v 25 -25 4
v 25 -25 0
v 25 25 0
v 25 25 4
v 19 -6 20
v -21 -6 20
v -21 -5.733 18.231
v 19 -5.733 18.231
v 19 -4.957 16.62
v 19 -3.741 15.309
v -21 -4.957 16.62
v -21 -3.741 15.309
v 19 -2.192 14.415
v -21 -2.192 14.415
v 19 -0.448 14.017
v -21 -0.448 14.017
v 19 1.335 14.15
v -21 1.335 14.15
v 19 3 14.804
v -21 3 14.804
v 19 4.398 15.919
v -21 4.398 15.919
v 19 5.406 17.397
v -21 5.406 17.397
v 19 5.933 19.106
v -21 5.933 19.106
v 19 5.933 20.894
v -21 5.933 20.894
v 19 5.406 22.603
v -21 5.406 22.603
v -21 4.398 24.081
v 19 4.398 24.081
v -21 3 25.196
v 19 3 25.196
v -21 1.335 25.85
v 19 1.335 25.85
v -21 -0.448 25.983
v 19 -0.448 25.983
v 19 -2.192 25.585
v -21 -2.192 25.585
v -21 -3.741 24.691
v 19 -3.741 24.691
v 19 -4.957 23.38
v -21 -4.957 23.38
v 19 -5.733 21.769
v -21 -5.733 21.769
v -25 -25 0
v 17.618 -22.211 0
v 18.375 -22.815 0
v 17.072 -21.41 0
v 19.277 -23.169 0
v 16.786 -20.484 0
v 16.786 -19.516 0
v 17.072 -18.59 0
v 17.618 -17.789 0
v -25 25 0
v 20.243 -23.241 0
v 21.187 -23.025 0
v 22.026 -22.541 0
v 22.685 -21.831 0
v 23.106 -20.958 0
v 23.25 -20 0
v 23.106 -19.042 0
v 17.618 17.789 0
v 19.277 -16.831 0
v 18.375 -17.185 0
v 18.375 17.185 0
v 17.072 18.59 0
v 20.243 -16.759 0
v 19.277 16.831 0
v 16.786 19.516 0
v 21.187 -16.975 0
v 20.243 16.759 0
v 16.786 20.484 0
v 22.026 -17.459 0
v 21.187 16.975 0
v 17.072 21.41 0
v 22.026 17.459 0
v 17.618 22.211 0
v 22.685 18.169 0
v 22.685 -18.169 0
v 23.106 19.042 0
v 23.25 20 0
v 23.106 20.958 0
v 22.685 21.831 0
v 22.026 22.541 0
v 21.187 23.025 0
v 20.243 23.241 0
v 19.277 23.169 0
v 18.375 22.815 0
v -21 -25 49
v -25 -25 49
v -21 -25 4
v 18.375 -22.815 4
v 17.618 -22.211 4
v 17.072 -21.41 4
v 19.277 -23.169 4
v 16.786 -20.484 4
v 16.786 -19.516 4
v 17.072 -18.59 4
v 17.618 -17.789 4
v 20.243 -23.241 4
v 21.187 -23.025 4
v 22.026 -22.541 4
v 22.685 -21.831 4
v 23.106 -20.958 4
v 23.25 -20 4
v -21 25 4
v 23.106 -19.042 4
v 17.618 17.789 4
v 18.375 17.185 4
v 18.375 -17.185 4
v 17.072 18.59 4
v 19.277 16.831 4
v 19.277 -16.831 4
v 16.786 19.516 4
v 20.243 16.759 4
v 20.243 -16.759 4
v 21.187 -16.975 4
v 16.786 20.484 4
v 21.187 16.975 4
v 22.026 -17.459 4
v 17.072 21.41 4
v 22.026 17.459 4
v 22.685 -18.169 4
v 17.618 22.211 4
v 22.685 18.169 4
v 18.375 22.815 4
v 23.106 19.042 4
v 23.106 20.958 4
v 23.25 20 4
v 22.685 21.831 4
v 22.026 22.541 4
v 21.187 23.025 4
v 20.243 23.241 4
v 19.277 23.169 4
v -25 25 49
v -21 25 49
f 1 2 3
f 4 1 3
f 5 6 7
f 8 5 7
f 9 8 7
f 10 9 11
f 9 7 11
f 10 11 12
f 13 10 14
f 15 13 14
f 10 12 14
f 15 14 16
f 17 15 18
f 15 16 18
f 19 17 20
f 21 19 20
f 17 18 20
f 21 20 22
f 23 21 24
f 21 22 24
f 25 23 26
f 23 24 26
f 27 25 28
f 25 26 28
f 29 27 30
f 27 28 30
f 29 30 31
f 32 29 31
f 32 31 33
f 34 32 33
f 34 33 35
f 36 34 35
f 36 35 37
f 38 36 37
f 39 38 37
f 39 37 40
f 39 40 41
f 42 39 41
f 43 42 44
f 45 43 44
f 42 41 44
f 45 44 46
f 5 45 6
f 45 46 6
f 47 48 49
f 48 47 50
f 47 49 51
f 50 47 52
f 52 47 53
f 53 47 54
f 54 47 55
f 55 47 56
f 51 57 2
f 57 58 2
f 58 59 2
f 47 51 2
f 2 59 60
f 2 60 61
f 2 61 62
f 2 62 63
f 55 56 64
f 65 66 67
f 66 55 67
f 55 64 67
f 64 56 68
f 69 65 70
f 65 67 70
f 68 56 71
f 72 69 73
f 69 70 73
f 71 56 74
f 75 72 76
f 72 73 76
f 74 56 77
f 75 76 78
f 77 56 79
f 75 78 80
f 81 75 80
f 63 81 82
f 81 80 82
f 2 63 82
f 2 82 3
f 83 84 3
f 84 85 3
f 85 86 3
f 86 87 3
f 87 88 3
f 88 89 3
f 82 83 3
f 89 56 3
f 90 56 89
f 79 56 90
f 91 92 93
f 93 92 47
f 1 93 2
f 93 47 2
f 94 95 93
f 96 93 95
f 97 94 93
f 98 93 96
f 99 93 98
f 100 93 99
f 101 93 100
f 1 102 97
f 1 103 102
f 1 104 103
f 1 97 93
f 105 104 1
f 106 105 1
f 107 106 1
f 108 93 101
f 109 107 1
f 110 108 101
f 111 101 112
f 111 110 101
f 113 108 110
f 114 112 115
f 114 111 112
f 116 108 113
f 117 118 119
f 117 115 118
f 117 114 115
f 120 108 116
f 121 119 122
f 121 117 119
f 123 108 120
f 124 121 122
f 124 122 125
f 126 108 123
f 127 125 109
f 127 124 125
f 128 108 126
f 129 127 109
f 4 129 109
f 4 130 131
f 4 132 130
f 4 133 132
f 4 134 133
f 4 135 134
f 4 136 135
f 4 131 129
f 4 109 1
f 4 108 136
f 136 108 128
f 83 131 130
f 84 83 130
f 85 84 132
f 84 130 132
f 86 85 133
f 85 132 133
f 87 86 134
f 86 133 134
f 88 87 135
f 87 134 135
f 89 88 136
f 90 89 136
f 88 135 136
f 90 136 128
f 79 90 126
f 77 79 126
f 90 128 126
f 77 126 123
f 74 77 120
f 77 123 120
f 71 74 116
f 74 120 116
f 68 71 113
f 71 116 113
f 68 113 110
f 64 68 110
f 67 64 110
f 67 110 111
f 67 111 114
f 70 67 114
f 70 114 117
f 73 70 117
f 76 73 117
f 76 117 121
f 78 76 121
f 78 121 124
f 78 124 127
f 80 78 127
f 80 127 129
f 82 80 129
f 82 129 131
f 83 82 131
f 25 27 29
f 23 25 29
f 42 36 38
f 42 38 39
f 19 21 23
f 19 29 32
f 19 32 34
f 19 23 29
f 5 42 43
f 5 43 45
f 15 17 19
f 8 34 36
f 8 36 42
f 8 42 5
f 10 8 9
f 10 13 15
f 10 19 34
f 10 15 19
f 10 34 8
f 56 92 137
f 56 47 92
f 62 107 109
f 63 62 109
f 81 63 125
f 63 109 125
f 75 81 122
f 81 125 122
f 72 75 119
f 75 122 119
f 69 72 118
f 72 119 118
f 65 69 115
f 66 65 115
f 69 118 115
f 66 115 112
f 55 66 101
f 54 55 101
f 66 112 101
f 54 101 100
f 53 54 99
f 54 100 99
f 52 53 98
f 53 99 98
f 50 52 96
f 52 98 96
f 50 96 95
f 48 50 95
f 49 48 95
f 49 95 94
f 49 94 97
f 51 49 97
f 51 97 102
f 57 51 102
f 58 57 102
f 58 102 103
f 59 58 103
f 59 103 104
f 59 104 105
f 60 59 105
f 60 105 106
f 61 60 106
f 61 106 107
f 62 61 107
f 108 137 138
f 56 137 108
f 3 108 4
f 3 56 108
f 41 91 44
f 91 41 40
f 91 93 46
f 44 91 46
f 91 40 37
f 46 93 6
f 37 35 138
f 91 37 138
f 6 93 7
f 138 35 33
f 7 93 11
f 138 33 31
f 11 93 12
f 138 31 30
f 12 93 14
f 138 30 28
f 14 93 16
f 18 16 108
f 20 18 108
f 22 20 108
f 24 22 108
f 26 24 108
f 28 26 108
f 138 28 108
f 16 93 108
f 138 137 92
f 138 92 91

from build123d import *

# Parameters (mm, degrees)
SKETCH1_W           = 50
SKETCH1_H           = 50
BOSS_EXTRUDE1_DEPTH = 4
SKETCH2_W           = 4
SKETCH2_H           = 50
BOSS_EXTRUDE2_DEPTH = 45
SKETCH4_R           = 6
BOSS_EXTRUDE3_DEPTH = 40
SKETCH5_R           = 3.25
CUT_EXTRUDE1_DEPTH  = 40


with BuildPart() as part:
    # Sketch1 → Boss-Extrude1 (new body)
    with BuildSketch(Plane.XY):
        Rectangle(SKETCH1_W, SKETCH1_H)
    extrude(amount=BOSS_EXTRUDE1_DEPTH)

    # Sketch2 → Boss-Extrude2 (add)
    with BuildSketch(Plane.XY.offset(4)):
        with Locations((-23, 0)):
            Rectangle(SKETCH2_W, SKETCH2_H)
    extrude(amount=BOSS_EXTRUDE2_DEPTH)

    # Sketch4 → Boss-Extrude3 (add)
    with BuildSketch(Plane(origin=(-21, 0, 0), x_dir=(0, 0, -1), z_dir=(1, 0, 0))):
        with Locations(Location((-20, 0, 0), (0, 0, 270))):
            Circle(SKETCH4_R)
    extrude(amount=BOSS_EXTRUDE3_DEPTH)

    # Sketch5 → Cut-Extrude1 (cut)
    with BuildSketch(Plane.XY.offset(4)):
        with Locations((20, 20)):
            Circle(SKETCH5_R)
        with Locations((20, -20)):
            Circle(SKETCH5_R)
    extrude(amount=-CUT_EXTRUDE1_DEPTH, mode=Mode.SUBTRACT)


solid = part.part
